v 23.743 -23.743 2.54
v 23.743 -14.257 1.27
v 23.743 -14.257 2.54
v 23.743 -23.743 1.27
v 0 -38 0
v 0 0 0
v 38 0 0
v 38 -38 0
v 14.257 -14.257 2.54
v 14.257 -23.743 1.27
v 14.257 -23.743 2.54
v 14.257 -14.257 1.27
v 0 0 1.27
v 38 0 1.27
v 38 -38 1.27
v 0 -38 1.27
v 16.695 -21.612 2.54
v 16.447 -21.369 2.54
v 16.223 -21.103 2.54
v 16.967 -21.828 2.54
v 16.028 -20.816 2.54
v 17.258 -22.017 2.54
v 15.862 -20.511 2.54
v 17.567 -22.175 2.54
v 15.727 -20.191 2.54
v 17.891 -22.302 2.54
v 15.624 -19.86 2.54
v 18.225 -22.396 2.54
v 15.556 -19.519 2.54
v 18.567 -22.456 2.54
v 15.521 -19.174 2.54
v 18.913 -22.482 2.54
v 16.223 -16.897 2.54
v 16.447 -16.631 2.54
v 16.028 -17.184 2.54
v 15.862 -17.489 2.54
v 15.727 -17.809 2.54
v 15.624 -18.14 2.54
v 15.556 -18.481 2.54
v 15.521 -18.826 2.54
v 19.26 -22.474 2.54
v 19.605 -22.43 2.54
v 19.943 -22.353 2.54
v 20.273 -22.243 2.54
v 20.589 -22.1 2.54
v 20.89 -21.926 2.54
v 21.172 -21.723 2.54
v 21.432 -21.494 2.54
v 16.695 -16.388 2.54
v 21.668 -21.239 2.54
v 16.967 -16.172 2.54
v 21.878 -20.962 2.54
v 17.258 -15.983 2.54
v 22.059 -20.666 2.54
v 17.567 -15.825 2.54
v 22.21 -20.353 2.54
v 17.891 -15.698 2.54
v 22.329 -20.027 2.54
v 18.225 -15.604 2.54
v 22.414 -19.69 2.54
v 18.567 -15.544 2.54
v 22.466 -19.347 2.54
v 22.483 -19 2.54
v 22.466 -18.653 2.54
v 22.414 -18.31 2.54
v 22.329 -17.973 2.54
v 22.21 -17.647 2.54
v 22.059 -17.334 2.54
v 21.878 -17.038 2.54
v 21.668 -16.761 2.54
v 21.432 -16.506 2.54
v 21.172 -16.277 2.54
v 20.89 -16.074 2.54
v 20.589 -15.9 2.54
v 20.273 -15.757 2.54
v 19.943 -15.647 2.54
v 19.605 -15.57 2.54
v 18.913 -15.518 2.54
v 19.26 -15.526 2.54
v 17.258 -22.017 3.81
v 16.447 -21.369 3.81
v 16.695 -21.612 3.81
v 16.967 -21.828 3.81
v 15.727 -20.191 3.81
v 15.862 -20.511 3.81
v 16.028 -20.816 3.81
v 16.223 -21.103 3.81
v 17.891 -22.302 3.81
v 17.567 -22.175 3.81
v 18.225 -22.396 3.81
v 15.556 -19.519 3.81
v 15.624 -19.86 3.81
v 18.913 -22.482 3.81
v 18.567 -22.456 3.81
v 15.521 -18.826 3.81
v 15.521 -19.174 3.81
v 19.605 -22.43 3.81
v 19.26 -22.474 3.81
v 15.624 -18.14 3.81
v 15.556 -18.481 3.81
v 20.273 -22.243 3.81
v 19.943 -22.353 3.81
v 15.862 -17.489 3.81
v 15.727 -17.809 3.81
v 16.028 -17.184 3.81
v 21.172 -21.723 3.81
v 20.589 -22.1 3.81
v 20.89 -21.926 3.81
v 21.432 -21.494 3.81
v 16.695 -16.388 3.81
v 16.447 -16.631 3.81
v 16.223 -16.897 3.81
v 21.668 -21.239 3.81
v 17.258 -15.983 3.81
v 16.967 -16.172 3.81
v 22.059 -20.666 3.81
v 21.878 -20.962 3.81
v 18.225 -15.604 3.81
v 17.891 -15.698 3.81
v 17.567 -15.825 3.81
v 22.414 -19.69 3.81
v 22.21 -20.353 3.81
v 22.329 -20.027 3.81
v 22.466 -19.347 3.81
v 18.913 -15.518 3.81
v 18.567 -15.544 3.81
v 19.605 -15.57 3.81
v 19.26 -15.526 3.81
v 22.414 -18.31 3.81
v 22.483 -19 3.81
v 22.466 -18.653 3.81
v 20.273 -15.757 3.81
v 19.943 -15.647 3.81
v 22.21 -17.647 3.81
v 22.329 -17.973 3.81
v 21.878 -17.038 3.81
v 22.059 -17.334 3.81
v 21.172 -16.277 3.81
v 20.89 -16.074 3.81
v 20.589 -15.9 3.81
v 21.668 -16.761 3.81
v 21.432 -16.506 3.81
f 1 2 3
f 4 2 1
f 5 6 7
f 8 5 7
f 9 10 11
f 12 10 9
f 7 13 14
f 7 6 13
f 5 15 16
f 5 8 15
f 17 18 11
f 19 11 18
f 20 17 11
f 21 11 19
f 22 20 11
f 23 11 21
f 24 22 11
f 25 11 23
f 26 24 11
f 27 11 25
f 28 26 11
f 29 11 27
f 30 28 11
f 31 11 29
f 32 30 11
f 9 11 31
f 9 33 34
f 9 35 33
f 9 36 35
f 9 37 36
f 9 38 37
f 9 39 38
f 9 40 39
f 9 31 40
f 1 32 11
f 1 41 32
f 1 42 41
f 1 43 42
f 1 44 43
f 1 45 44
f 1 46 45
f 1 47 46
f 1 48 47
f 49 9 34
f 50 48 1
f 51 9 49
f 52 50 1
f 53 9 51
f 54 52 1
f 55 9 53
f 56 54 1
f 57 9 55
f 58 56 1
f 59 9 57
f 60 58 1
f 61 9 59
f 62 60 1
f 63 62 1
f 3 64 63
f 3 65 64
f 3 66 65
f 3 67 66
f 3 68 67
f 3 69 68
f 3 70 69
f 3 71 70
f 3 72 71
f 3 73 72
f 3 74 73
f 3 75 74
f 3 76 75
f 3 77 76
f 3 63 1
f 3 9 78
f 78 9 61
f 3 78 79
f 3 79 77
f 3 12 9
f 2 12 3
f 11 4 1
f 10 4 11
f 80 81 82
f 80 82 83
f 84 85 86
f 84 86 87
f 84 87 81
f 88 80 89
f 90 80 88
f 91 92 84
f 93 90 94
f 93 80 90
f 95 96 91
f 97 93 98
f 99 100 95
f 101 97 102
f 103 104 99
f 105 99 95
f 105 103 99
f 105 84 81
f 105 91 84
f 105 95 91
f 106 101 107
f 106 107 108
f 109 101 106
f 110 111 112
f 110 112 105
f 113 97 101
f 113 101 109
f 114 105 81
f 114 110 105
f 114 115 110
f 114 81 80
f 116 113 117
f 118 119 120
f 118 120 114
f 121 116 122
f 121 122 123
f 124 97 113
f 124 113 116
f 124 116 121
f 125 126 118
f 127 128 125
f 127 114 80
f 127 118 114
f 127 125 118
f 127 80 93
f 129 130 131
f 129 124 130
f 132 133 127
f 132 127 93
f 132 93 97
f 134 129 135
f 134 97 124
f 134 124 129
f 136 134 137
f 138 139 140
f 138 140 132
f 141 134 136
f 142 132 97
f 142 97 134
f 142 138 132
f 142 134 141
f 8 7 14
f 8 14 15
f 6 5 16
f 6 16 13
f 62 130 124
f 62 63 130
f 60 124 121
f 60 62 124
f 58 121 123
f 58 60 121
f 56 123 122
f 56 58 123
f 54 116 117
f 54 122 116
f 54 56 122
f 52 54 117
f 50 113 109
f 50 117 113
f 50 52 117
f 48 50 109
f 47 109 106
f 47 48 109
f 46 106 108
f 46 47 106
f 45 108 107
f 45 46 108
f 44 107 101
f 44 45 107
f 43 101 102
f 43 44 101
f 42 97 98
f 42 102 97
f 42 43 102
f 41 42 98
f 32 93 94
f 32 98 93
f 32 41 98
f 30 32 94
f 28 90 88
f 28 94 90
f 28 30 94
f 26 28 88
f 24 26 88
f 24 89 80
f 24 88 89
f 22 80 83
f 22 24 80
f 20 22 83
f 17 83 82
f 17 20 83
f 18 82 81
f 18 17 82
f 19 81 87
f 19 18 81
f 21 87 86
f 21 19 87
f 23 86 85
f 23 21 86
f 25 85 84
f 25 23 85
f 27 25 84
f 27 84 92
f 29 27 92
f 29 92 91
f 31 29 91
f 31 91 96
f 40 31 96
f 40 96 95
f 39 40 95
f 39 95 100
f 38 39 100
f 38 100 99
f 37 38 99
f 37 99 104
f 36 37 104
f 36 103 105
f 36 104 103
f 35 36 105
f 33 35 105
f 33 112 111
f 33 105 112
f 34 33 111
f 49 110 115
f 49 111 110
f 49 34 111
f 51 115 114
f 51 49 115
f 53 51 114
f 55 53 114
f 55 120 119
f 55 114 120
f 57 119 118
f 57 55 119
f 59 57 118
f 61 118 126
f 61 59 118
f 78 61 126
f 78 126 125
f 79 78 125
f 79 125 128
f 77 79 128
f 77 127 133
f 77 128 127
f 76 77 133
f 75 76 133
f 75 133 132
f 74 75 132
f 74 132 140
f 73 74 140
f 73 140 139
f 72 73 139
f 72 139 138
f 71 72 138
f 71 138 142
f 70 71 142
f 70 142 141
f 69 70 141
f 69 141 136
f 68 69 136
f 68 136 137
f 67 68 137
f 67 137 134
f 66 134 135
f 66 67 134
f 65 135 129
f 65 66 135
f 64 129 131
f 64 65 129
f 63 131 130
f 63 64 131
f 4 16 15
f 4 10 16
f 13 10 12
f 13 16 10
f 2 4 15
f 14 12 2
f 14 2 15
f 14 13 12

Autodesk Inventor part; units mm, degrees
ref_plane "YZ Plane" through (0, 0, 0) normal (1, 0, 0) x (0, 1, 0)
ref_plane "XZ Plane" through (0, 0, 0) normal (0, 1, 0) x (-1, 0, 0)
ref_plane "XY Plane" through (0, 0, 0) normal (0, 0, 1) x (1, 0, 0)
sketch "Sketch1" plane through (0, 0, 0) normal (0, 0, 1) x (1, 0, 0)
  line L0 (0, 0) -> (38, 0)
  line L1 (38, 0) -> (38, -38)
  line L2 (38, -38) -> (0, -38)
  line L3 (0, -38) -> (0, 0)
  dimension "d0" = 38
  dimension "d1" = 38
extrude "Extrusion1" add sketch "Sketch1" along normal blind 1.27
sketch "Sketch2" plane through (0, 0, 1.27) normal (0, 0, 1) x (1, 0, 0)
  line L0 (0, -38) -> (38, -38) construction
  line L1 (0, 0) -> (38, -38) construction
  line L2 (38, -38) -> (38, 0) construction
  line L3 (38, 0) -> (0, -38) construction
  line L4 (14.2571, -14.2571) -> (23.7429, -14.2571)
  line L5 (23.7429, -14.2571) -> (23.7429, -23.7429)
  line L6 (23.7429, -23.7429) -> (14.2571, -23.7429)
  line L7 (14.2571, -23.7429) -> (14.2571, -14.2571)
  line L8 (14.2571, -14.2571) -> (23.7429, -23.7429) construction
  line L9 (23.7429, -14.2571) -> (14.2571, -23.7429) construction
  point P0 (19, -19)
extrude "Extrusion2" add sketch "Sketch2" along normal blind 1.27
sketch "Sketch3" plane through (0, 0, 2.54) normal (0, 0, 1) x (1, 0, 0)
  line L0 (23.7429, -14.2571) -> (14.2571, -14.2571) construction
  line L1 (23.7429, -23.7429) -> (23.7429, -14.2571) construction
  line L2 (14.2571, -14.2571) -> (23.7429, -23.7429) construction
  line L3 (14.2571, -14.2571) -> (14.2571, -23.7429) construction
  line L4 (23.7429, -14.2571) -> (14.2571, -23.7429) construction
  circle A0 centre (19, -19) radius 3.4833
  point P0 (0, 0)
extrude "Extrusion3" add sketch "Sketch3" along normal blind 1.27
properties part number "Nav_Camera"
